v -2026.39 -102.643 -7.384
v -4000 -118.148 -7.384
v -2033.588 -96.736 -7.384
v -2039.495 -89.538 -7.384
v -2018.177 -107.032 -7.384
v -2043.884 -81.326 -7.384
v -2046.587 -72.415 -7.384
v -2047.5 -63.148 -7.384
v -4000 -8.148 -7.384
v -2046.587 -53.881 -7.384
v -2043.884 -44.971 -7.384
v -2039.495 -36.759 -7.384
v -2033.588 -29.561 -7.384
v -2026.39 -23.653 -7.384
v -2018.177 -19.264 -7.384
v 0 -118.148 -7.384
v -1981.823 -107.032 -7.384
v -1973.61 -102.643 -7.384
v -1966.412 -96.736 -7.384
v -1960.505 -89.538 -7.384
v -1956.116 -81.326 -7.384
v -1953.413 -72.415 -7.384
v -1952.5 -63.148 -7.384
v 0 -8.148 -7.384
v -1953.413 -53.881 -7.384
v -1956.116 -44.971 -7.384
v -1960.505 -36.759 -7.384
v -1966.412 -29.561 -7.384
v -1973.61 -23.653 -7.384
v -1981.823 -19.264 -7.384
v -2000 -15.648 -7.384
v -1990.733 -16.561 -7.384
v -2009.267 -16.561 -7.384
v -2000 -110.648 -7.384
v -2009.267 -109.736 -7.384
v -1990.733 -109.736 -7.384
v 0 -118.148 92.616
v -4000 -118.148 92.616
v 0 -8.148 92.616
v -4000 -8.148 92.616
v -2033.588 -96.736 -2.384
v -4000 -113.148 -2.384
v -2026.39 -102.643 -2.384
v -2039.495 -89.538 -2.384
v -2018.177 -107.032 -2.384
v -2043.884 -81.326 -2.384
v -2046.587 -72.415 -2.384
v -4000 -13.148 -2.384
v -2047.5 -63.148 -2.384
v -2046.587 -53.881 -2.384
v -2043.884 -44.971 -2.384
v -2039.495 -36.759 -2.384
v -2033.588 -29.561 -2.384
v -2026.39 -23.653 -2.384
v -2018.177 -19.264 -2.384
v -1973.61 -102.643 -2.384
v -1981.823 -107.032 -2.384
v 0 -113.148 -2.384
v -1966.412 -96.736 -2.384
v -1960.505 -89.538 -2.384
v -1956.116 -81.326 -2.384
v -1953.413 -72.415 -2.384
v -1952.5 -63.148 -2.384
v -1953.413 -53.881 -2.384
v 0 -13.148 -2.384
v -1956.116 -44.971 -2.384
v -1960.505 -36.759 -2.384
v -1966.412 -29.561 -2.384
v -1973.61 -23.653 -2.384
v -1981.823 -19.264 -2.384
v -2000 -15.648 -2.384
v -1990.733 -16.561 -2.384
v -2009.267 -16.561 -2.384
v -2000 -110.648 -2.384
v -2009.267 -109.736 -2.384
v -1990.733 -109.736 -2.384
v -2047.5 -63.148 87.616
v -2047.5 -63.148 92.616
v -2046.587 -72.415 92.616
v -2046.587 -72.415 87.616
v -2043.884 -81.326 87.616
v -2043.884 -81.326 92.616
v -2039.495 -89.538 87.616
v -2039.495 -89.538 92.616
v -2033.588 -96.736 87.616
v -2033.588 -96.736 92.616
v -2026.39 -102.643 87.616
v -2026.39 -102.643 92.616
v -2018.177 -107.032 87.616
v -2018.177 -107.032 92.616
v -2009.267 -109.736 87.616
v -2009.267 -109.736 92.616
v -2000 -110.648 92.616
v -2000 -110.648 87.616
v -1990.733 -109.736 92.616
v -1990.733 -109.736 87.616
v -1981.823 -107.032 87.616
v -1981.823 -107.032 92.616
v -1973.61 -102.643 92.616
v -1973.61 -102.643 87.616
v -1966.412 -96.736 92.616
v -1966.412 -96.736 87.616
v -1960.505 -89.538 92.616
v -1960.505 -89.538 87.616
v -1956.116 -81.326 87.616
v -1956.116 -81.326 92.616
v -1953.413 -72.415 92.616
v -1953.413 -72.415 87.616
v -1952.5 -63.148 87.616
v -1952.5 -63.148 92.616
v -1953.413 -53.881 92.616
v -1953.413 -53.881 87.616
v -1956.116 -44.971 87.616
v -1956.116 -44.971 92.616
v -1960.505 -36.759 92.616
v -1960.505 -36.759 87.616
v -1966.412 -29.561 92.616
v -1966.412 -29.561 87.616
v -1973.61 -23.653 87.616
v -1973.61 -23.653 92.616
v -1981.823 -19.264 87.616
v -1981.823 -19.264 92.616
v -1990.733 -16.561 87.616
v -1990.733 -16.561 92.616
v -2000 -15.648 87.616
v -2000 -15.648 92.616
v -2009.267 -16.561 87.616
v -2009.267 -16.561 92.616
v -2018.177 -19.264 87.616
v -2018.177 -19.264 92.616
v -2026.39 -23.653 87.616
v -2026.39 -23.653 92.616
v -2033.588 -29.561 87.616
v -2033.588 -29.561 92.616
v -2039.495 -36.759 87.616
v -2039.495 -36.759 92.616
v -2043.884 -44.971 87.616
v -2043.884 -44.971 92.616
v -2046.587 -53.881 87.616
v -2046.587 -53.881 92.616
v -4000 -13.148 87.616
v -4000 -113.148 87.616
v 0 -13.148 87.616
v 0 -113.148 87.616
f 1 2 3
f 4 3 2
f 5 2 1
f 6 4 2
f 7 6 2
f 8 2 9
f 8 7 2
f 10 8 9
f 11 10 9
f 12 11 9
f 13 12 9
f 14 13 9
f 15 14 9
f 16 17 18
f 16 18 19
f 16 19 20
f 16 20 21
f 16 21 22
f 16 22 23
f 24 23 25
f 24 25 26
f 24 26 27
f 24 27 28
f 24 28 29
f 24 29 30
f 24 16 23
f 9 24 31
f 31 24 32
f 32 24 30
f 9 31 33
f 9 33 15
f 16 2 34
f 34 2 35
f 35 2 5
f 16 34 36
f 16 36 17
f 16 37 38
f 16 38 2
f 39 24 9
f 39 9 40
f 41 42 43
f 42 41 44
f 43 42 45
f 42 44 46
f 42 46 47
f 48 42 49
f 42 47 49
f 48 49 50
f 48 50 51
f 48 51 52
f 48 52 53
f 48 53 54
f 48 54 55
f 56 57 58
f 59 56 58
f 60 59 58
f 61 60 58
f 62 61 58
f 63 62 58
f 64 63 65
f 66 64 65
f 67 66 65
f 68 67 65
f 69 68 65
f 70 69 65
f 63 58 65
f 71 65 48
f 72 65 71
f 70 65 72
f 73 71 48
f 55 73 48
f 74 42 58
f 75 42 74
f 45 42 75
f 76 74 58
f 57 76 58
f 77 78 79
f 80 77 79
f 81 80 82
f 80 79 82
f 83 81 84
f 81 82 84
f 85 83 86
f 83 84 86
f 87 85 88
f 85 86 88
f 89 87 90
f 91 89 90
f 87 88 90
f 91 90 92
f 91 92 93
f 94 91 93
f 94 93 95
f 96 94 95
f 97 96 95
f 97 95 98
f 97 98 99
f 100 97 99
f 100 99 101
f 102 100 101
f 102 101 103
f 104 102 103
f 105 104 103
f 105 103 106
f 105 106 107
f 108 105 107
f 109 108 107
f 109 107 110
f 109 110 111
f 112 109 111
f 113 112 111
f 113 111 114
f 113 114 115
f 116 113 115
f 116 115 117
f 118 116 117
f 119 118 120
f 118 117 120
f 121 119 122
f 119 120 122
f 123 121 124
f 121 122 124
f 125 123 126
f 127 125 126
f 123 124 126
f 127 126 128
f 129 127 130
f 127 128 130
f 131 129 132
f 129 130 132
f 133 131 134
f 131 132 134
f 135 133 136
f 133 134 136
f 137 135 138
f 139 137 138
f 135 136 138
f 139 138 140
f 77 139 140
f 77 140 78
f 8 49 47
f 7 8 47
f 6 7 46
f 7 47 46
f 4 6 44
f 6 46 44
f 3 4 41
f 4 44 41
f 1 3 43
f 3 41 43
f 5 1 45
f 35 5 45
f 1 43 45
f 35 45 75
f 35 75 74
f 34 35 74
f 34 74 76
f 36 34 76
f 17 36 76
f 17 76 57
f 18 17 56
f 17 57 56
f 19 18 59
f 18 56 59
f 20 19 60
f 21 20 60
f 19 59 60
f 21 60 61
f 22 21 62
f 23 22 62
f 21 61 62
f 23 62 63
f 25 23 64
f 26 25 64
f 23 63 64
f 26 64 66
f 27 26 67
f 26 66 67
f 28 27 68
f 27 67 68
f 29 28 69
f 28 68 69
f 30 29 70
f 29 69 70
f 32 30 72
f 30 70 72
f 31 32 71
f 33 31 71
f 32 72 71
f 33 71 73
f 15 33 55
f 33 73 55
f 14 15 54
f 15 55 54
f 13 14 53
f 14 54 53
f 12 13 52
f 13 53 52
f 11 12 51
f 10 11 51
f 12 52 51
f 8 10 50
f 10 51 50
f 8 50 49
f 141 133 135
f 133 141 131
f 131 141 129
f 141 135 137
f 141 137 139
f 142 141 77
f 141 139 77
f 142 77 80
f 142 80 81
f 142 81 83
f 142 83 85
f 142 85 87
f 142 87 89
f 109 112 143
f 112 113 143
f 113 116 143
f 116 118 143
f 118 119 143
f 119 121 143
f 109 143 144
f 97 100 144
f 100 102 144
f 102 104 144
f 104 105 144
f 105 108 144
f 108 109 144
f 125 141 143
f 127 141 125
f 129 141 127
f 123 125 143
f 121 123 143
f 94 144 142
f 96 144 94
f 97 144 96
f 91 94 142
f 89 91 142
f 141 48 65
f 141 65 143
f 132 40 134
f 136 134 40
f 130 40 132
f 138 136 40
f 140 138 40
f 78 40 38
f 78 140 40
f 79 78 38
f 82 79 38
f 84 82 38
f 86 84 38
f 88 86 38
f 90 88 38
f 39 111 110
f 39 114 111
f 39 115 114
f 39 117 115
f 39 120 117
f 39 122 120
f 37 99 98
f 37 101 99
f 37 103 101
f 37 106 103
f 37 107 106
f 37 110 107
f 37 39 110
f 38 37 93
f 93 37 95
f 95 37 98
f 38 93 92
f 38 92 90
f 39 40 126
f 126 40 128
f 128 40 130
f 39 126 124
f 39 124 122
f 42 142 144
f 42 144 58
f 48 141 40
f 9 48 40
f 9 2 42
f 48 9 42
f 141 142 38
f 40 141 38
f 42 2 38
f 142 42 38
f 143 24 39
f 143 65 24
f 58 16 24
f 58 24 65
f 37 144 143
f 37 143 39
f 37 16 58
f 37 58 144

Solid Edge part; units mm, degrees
sketch "Sketch1" plane through (0, 0, 0) normal (1, 0, 0) x (0, 1, 0)
  line L0 (-113.1482, -2.3837) -> (-13.1482, -2.3837)
  line L1 (-13.1482, -2.3837) -> (-13.1482, 87.6163)
  line L2 (-13.1482, 87.6163) -> (-113.1482, 87.6163)
  line L3 (-113.1482, 87.6163) -> (-113.1482, -2.3837)
  line L4 (-118.1482, -7.3837) -> (-8.1482, -7.3837)
  line L5 (-8.1482, -7.3837) -> (-8.1482, 92.6163)
  line L6 (-8.1482, 92.6163) -> (-118.1482, 92.6163)
  line L7 (-118.1482, 92.6163) -> (-118.1482, -7.3837)
  dimension "D1" = 100
  dimension "D2" = 110
  dimension "D3" = 100
  dimension "D4" = 90
extrude "Protrusion1" add sketch "Sketch1" against normal blind 4000
sketch "Sketch2" plane through (-1250, -71.3361, 94.6163) normal (0, 0, 1) x (-1, 0, 0)
  circle A0 centre (750, -8.1879) radius 47.5
  dimension "D1" = 2000
extrude "Cutout1" cut sketch "Sketch2" against normal through all
